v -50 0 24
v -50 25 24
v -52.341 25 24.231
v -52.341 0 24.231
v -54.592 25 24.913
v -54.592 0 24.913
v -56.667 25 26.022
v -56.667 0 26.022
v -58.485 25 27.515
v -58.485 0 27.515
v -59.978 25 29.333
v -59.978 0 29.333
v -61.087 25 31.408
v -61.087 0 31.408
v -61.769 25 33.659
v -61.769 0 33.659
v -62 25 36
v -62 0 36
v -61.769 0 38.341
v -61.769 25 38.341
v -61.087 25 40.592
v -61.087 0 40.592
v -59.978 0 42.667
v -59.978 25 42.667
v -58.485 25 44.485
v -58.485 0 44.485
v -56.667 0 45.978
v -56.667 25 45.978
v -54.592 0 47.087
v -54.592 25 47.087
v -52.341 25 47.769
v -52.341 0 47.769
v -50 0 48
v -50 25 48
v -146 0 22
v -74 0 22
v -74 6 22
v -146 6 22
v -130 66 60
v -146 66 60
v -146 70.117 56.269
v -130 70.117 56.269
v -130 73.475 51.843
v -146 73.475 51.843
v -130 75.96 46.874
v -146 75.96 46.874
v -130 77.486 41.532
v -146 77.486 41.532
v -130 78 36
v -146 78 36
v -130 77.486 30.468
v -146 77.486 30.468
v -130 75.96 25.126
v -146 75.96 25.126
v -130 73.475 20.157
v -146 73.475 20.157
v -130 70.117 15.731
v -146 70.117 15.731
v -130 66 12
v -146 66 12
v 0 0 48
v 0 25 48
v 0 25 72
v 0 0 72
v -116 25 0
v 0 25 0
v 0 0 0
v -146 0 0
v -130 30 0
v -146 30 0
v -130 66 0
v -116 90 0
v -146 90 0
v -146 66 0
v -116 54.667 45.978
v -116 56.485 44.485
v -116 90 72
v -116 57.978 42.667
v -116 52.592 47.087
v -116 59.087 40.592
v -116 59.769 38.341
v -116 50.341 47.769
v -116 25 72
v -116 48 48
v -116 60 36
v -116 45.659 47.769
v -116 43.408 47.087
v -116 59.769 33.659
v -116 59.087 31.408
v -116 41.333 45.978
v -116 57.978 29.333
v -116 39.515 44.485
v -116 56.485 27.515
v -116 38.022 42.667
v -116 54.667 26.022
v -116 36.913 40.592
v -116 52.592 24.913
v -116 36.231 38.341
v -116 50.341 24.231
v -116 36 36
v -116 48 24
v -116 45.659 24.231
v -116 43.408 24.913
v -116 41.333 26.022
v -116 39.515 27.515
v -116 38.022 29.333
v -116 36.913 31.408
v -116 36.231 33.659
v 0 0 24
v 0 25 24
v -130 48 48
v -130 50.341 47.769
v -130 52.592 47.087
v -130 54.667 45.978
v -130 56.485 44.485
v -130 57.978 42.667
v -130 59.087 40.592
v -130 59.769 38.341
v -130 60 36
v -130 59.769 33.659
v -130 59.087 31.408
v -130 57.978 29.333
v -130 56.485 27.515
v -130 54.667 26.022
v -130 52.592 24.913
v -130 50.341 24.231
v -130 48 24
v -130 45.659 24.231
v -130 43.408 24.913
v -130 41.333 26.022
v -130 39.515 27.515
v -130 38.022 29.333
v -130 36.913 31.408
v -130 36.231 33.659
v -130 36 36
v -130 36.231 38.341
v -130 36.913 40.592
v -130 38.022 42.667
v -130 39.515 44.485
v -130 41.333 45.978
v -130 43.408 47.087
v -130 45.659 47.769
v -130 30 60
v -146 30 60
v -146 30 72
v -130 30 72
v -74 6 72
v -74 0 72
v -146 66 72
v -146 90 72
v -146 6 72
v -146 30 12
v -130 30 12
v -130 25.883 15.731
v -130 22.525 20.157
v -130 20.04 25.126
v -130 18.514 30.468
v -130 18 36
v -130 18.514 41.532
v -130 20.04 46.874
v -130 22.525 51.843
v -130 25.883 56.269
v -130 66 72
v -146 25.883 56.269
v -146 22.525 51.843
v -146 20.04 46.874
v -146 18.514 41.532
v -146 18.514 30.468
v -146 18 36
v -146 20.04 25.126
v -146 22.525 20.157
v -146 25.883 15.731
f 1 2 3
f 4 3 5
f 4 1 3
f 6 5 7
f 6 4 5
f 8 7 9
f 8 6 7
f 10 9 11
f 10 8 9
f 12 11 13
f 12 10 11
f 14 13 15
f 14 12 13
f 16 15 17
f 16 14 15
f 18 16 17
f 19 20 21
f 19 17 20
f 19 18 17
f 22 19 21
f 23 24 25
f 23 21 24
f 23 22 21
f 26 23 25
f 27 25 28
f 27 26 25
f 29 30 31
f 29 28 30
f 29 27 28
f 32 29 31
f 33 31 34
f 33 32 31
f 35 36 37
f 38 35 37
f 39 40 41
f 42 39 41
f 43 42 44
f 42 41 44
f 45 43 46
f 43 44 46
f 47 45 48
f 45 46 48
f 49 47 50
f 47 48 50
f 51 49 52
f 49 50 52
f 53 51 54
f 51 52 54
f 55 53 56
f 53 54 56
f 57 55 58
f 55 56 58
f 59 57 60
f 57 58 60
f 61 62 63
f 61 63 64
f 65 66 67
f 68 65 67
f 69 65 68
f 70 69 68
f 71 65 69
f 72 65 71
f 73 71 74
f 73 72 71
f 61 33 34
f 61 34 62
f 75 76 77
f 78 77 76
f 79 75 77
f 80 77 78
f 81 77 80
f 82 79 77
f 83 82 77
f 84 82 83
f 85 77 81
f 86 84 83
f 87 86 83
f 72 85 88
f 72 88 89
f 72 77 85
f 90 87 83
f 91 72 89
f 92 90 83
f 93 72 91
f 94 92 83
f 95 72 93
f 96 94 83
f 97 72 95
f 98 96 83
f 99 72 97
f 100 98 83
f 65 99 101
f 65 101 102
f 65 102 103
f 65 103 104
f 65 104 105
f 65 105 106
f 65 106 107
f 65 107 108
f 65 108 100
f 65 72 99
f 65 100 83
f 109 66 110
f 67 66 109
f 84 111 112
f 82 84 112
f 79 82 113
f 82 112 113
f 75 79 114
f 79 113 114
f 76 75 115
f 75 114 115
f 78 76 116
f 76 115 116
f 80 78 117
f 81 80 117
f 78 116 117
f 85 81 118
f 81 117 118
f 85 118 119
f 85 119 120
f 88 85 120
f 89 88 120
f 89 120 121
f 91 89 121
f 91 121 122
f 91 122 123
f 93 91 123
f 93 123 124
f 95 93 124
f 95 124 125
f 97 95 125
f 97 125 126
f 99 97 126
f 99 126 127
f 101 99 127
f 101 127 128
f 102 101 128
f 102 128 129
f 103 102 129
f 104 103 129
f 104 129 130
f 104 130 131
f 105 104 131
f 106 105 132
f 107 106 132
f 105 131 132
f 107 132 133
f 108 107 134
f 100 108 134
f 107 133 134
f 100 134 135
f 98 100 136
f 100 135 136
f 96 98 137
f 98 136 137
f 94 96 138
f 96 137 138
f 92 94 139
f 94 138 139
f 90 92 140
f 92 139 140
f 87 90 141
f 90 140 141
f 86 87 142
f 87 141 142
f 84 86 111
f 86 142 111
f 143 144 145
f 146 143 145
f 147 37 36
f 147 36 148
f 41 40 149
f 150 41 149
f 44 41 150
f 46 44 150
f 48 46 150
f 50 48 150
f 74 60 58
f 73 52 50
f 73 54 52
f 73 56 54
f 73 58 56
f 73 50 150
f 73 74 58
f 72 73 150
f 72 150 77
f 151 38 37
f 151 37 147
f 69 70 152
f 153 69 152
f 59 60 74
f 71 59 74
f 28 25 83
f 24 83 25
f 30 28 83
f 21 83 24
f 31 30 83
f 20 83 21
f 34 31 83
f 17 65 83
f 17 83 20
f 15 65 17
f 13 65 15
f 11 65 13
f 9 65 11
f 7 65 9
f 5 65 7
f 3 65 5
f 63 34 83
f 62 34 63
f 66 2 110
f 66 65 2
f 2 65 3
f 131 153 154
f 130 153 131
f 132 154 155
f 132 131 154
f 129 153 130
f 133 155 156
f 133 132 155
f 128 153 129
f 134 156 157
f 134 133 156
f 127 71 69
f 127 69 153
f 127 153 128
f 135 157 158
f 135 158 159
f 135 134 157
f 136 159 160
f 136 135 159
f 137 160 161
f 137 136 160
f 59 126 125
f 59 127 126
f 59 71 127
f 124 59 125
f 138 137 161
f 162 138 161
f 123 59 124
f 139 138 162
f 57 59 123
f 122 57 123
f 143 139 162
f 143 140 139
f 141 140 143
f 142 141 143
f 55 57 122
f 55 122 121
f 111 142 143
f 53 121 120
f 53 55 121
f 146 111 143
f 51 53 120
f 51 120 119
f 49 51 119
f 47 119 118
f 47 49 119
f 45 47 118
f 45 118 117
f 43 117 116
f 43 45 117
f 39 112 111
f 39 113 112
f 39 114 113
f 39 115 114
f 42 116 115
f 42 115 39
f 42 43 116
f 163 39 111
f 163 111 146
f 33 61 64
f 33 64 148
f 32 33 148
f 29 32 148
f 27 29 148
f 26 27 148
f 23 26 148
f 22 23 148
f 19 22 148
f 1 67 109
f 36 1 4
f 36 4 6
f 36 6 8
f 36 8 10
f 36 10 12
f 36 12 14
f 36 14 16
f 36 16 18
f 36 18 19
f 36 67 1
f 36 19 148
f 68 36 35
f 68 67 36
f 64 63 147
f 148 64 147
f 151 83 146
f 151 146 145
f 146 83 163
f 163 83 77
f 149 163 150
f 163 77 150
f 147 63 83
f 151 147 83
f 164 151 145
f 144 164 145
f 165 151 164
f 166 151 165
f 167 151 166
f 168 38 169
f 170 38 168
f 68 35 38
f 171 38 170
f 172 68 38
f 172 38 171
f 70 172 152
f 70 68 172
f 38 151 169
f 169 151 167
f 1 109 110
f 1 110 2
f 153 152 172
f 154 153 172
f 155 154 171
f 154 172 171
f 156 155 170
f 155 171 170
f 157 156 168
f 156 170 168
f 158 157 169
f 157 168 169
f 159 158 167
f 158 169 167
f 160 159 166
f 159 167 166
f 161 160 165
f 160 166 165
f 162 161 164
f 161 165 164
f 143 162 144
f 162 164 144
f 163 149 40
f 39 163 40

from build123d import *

# Parameters (mm, degrees)
BOSS_EXTRUDE1_DEPTH     = 72
CUT_EXTRUDE2_DEPTH      = 176.28548143
CUT_EXTRUDE2_DEPTH_BACK = 25
SKETCH3_W               = 50
SKETCH3_H               = 6
CUT_EXTRUDE4_DEPTH      = 72
CUT_EXTRUDE6_DEPTH      = 16
SKETCH5_R               = 12
CUT_EXTRUDE7_DEPTH      = 16


with BuildPart() as part:
    # Sketch1 → Boss-Extrude1 (new body)
    with BuildSketch(Plane.XY):
        Polygon((0, 0), (-146, 0), (-146, 90), (-116, 90), (-116, 25), (0, 25), align=None)
    extrude(amount=BOSS_EXTRUDE1_DEPTH)

    # Sketch2 → Cut-Extrude2 (cut, two sides: drawn at the far end of the back side and taken through both)
    with BuildSketch(Plane(origin=(0, 25, 0), x_dir=(1, 0, 0), z_dir=(0, 1, 0)).offset(-CUT_EXTRUDE2_DEPTH_BACK)):
        with BuildLine():
            Line((-50, -48), (0, -48))
            Line((0, -48), (0, -24))
            Line((0, -24), (-50, -24))
            ThreePointArc((-50, -24), (-62, -36), (-50, -48))
        make_face()
    extrude(amount=CUT_EXTRUDE2_DEPTH + CUT_EXTRUDE2_DEPTH_BACK, mode=Mode.SUBTRACT)

    # Sketch3 → Cut-Extrude4 (cut)
    with BuildSketch(Plane.ZY.offset(146)):
        with Locations((47, 3)):
            Rectangle(SKETCH3_W, SKETCH3_H)
    extrude(amount=-CUT_EXTRUDE4_DEPTH, mode=Mode.SUBTRACT)

    # Sketch4 → Cut-Extrude6 (cut)
    with BuildSketch(Plane.ZY.offset(146)):
        with BuildLine():
            Line((12, 66), (0, 66))
            Line((0, 66), (0, 30))
            Line((0, 30), (12, 30))
            ThreePointArc((12, 30), (36, 18), (60, 30))
            Line((60, 30), (72, 30))
            Line((72, 30), (72, 66))
            Line((72, 66), (60, 66))
            ThreePointArc((60, 66), (36, 78), (12, 66))
        make_face()
    extrude(amount=-CUT_EXTRUDE6_DEPTH, mode=Mode.SUBTRACT)

    # Sketch5 → Cut-Extrude7 (cut)
    with BuildSketch(Plane.ZY.offset(130)):
        with Locations((36, 48)):
            Circle(SKETCH5_R)
    extrude(amount=-CUT_EXTRUDE7_DEPTH, mode=Mode.SUBTRACT)


solid = part.part
